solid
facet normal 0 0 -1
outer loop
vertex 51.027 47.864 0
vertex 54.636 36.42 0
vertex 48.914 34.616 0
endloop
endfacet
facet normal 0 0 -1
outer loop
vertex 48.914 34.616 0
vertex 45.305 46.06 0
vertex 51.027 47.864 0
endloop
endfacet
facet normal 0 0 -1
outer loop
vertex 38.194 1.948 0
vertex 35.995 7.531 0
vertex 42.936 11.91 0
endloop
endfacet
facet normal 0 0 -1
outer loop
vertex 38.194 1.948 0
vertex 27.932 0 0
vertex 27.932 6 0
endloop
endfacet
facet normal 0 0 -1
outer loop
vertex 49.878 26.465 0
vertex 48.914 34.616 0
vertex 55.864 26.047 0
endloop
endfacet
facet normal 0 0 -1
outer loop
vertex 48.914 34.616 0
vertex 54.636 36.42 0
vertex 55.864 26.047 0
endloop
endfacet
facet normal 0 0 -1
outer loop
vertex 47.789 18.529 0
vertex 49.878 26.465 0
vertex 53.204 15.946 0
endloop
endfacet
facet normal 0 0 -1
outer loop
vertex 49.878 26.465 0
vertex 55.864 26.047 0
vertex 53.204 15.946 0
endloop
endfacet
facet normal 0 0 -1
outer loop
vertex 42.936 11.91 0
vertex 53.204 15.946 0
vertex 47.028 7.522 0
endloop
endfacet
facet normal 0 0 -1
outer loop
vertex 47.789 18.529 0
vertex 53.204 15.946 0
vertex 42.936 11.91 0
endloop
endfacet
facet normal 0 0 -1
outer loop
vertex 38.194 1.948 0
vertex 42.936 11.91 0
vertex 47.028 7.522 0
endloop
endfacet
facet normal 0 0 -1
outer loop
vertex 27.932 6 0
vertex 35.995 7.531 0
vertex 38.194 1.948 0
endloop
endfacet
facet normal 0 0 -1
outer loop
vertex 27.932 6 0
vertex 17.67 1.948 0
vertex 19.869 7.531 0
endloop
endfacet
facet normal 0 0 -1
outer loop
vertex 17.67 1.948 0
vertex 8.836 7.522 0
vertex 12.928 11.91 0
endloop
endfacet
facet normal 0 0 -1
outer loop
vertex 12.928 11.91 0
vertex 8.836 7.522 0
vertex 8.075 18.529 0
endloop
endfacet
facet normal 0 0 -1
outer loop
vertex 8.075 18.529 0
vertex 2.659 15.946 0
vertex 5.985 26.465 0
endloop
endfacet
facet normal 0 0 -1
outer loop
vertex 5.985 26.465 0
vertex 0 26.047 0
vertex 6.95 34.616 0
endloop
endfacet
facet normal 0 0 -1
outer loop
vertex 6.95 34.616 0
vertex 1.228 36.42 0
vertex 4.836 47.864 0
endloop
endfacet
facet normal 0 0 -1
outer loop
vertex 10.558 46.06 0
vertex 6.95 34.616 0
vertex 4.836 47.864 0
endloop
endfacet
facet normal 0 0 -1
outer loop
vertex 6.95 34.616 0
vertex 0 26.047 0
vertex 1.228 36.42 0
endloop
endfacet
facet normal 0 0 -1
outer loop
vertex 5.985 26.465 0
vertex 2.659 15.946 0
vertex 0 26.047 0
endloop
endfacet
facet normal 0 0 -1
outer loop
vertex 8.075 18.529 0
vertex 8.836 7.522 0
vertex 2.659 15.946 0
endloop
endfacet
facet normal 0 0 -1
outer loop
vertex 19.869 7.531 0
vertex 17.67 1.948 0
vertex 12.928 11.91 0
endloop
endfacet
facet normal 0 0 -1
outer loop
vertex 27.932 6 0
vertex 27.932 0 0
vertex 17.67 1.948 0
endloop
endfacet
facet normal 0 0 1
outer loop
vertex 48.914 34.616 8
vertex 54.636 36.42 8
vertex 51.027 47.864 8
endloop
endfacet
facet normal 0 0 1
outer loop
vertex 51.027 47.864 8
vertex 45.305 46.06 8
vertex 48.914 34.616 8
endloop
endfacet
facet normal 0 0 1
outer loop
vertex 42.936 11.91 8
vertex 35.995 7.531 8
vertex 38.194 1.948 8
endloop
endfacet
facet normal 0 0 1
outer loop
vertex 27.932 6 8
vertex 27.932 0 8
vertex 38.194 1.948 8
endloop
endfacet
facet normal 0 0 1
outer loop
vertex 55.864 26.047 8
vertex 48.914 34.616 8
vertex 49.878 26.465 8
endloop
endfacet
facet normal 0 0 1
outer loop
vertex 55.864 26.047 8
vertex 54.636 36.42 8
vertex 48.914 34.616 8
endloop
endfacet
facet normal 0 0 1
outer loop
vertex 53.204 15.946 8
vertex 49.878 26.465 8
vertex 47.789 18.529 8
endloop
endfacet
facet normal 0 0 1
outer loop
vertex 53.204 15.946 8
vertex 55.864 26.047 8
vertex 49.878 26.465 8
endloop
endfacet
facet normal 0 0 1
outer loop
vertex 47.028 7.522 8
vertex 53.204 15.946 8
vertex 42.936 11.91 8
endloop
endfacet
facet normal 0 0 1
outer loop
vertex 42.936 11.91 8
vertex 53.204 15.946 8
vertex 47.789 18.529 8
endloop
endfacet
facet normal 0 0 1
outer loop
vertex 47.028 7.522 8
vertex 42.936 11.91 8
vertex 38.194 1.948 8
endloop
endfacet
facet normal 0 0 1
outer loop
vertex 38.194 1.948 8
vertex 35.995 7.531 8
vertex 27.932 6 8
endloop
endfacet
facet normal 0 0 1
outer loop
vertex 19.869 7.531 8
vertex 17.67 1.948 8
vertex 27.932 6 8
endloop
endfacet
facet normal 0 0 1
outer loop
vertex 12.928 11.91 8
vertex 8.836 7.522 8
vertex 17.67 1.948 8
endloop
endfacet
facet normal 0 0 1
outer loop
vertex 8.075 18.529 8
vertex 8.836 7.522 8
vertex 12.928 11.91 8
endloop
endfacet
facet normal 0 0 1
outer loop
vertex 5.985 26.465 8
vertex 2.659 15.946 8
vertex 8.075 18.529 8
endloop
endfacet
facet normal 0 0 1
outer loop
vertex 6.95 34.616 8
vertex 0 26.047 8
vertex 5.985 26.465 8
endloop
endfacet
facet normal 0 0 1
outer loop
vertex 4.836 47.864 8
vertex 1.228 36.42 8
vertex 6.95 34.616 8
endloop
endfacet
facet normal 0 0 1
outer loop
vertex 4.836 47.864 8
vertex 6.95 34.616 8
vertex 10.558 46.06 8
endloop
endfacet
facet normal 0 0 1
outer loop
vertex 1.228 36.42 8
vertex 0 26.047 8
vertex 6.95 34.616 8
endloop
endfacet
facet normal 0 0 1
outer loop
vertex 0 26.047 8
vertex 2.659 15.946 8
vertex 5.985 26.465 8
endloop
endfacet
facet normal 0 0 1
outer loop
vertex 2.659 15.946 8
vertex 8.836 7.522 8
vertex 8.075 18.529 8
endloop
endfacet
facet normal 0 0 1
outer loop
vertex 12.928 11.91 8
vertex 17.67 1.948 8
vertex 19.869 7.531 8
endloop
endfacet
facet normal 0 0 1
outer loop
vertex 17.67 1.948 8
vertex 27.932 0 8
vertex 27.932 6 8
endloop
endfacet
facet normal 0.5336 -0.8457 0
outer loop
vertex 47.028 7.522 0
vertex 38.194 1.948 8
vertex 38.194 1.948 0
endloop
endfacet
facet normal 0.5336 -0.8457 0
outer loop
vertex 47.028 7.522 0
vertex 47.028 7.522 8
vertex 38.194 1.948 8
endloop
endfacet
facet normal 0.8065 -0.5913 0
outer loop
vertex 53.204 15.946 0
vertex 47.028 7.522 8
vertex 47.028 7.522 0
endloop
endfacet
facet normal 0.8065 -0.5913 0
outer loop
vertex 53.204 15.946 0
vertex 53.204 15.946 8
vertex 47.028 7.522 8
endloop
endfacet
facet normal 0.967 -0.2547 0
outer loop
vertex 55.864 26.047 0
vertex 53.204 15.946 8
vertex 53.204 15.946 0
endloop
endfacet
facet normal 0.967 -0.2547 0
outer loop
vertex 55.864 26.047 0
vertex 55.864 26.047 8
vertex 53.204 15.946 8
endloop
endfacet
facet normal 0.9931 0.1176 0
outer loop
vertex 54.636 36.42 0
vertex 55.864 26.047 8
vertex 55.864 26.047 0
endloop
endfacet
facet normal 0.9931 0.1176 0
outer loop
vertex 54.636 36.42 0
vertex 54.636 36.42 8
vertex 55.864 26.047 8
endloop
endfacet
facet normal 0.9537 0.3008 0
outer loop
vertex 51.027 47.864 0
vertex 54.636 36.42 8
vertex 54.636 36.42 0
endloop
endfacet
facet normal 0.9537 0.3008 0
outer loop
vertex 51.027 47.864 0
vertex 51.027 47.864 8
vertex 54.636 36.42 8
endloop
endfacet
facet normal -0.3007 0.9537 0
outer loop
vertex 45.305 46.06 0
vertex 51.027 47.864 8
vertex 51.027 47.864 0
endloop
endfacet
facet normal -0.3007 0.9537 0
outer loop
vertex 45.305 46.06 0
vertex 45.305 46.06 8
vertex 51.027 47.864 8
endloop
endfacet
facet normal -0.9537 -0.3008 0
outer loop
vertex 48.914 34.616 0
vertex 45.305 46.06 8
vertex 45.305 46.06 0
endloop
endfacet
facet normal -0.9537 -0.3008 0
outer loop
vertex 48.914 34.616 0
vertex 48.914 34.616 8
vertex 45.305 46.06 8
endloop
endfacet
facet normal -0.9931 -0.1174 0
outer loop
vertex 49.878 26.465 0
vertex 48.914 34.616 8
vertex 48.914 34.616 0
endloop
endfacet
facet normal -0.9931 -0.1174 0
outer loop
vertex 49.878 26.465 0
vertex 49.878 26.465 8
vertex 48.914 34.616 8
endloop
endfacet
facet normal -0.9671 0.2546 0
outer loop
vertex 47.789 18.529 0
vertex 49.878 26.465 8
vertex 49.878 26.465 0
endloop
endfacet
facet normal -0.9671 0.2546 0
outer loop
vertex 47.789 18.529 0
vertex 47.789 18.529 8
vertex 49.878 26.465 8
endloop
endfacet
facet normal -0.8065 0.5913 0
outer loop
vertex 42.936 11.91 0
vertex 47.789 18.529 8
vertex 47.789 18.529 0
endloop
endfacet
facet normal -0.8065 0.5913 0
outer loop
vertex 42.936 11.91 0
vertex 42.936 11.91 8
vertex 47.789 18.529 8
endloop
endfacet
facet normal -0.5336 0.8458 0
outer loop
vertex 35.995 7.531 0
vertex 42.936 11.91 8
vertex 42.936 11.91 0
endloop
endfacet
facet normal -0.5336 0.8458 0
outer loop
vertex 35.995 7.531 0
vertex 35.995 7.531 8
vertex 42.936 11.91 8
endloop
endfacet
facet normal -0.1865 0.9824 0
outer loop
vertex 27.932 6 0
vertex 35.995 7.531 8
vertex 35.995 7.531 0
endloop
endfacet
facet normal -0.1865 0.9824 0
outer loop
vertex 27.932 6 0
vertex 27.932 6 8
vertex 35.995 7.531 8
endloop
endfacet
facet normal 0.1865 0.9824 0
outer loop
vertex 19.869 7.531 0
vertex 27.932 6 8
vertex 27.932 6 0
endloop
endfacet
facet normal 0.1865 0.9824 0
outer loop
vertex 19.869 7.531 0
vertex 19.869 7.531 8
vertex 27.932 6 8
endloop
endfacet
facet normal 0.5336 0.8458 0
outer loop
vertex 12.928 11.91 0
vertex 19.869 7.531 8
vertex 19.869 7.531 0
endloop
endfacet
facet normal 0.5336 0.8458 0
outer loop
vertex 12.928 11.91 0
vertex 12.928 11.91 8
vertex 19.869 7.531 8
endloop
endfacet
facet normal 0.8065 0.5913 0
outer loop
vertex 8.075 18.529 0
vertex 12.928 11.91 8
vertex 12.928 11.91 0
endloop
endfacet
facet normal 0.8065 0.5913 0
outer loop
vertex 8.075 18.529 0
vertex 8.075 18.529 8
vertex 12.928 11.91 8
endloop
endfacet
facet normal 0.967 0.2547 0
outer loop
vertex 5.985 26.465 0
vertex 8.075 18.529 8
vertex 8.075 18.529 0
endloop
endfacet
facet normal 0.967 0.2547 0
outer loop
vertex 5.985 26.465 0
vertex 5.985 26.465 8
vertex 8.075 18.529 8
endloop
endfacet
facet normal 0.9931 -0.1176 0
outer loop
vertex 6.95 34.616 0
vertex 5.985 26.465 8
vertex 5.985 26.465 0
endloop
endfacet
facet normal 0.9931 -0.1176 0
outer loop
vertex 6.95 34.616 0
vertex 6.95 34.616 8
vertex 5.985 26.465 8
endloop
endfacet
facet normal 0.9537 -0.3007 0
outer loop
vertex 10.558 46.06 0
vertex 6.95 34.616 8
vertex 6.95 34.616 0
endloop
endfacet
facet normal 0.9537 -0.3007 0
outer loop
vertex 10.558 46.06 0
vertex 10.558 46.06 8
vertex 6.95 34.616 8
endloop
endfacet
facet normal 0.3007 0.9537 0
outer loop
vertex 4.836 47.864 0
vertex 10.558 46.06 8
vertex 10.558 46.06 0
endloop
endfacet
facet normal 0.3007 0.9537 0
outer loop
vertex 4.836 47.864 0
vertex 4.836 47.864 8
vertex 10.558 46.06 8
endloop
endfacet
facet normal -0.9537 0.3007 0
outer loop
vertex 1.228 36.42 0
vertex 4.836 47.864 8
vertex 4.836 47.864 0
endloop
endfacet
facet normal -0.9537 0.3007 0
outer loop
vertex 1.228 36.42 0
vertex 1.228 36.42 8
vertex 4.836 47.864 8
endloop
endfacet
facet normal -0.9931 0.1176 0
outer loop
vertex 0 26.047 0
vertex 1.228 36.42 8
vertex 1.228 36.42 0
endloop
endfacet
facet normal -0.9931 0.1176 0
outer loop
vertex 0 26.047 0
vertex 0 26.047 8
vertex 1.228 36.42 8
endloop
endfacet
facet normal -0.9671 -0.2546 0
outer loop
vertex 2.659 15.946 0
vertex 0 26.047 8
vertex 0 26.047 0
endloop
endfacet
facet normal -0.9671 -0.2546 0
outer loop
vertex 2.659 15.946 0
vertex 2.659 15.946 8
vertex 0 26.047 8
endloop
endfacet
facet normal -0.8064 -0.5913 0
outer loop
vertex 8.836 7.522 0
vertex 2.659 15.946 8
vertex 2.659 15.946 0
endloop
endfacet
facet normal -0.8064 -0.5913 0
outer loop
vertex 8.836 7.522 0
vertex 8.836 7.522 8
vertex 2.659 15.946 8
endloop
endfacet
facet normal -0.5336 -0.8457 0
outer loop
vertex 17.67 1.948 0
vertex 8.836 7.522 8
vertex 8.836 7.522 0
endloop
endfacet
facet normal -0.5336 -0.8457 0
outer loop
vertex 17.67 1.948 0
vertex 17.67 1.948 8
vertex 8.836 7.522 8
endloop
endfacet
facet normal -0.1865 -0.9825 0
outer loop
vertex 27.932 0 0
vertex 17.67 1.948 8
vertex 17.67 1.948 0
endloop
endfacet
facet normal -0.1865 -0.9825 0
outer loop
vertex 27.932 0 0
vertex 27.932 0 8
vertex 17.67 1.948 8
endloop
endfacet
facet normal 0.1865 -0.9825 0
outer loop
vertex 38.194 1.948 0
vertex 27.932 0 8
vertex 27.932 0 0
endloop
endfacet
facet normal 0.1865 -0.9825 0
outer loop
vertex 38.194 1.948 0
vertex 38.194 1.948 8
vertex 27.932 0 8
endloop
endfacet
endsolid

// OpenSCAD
$fn = 32;

// ----------------------------------------------------------------------
// Clip blank: omega clip, 8 mm thick
// ----------------------------------------------------------------------

// --- parameters (mm) ---
profile_height = 8;       // extrusion height
profile_points = 26;      // points of the closed outline

profile = [[1.228, 36.42], [0, 26.047], [2.659, 15.946], [8.836, 7.522], [17.67, 1.948], [27.932, 0], [38.194, 1.948], [47.028, 7.522], [53.204, 15.946], [55.864, 26.047], [54.636, 36.42], [51.027, 47.864], [45.305, 46.06], [48.914, 34.616], [49.878, 26.465], [47.789, 18.529], [42.936, 11.91], [35.995, 7.531], [27.932, 6], [19.869, 7.531], [12.928, 11.91], [8.075, 18.529], [5.985, 26.465], [6.95, 34.616], [10.558, 46.06], [4.836, 47.864]];  // single closed polygon, 26 points, counter clockwise

// --- the one profile operation ---
linear_extrude(height = profile_height) polygon(points = profile);
